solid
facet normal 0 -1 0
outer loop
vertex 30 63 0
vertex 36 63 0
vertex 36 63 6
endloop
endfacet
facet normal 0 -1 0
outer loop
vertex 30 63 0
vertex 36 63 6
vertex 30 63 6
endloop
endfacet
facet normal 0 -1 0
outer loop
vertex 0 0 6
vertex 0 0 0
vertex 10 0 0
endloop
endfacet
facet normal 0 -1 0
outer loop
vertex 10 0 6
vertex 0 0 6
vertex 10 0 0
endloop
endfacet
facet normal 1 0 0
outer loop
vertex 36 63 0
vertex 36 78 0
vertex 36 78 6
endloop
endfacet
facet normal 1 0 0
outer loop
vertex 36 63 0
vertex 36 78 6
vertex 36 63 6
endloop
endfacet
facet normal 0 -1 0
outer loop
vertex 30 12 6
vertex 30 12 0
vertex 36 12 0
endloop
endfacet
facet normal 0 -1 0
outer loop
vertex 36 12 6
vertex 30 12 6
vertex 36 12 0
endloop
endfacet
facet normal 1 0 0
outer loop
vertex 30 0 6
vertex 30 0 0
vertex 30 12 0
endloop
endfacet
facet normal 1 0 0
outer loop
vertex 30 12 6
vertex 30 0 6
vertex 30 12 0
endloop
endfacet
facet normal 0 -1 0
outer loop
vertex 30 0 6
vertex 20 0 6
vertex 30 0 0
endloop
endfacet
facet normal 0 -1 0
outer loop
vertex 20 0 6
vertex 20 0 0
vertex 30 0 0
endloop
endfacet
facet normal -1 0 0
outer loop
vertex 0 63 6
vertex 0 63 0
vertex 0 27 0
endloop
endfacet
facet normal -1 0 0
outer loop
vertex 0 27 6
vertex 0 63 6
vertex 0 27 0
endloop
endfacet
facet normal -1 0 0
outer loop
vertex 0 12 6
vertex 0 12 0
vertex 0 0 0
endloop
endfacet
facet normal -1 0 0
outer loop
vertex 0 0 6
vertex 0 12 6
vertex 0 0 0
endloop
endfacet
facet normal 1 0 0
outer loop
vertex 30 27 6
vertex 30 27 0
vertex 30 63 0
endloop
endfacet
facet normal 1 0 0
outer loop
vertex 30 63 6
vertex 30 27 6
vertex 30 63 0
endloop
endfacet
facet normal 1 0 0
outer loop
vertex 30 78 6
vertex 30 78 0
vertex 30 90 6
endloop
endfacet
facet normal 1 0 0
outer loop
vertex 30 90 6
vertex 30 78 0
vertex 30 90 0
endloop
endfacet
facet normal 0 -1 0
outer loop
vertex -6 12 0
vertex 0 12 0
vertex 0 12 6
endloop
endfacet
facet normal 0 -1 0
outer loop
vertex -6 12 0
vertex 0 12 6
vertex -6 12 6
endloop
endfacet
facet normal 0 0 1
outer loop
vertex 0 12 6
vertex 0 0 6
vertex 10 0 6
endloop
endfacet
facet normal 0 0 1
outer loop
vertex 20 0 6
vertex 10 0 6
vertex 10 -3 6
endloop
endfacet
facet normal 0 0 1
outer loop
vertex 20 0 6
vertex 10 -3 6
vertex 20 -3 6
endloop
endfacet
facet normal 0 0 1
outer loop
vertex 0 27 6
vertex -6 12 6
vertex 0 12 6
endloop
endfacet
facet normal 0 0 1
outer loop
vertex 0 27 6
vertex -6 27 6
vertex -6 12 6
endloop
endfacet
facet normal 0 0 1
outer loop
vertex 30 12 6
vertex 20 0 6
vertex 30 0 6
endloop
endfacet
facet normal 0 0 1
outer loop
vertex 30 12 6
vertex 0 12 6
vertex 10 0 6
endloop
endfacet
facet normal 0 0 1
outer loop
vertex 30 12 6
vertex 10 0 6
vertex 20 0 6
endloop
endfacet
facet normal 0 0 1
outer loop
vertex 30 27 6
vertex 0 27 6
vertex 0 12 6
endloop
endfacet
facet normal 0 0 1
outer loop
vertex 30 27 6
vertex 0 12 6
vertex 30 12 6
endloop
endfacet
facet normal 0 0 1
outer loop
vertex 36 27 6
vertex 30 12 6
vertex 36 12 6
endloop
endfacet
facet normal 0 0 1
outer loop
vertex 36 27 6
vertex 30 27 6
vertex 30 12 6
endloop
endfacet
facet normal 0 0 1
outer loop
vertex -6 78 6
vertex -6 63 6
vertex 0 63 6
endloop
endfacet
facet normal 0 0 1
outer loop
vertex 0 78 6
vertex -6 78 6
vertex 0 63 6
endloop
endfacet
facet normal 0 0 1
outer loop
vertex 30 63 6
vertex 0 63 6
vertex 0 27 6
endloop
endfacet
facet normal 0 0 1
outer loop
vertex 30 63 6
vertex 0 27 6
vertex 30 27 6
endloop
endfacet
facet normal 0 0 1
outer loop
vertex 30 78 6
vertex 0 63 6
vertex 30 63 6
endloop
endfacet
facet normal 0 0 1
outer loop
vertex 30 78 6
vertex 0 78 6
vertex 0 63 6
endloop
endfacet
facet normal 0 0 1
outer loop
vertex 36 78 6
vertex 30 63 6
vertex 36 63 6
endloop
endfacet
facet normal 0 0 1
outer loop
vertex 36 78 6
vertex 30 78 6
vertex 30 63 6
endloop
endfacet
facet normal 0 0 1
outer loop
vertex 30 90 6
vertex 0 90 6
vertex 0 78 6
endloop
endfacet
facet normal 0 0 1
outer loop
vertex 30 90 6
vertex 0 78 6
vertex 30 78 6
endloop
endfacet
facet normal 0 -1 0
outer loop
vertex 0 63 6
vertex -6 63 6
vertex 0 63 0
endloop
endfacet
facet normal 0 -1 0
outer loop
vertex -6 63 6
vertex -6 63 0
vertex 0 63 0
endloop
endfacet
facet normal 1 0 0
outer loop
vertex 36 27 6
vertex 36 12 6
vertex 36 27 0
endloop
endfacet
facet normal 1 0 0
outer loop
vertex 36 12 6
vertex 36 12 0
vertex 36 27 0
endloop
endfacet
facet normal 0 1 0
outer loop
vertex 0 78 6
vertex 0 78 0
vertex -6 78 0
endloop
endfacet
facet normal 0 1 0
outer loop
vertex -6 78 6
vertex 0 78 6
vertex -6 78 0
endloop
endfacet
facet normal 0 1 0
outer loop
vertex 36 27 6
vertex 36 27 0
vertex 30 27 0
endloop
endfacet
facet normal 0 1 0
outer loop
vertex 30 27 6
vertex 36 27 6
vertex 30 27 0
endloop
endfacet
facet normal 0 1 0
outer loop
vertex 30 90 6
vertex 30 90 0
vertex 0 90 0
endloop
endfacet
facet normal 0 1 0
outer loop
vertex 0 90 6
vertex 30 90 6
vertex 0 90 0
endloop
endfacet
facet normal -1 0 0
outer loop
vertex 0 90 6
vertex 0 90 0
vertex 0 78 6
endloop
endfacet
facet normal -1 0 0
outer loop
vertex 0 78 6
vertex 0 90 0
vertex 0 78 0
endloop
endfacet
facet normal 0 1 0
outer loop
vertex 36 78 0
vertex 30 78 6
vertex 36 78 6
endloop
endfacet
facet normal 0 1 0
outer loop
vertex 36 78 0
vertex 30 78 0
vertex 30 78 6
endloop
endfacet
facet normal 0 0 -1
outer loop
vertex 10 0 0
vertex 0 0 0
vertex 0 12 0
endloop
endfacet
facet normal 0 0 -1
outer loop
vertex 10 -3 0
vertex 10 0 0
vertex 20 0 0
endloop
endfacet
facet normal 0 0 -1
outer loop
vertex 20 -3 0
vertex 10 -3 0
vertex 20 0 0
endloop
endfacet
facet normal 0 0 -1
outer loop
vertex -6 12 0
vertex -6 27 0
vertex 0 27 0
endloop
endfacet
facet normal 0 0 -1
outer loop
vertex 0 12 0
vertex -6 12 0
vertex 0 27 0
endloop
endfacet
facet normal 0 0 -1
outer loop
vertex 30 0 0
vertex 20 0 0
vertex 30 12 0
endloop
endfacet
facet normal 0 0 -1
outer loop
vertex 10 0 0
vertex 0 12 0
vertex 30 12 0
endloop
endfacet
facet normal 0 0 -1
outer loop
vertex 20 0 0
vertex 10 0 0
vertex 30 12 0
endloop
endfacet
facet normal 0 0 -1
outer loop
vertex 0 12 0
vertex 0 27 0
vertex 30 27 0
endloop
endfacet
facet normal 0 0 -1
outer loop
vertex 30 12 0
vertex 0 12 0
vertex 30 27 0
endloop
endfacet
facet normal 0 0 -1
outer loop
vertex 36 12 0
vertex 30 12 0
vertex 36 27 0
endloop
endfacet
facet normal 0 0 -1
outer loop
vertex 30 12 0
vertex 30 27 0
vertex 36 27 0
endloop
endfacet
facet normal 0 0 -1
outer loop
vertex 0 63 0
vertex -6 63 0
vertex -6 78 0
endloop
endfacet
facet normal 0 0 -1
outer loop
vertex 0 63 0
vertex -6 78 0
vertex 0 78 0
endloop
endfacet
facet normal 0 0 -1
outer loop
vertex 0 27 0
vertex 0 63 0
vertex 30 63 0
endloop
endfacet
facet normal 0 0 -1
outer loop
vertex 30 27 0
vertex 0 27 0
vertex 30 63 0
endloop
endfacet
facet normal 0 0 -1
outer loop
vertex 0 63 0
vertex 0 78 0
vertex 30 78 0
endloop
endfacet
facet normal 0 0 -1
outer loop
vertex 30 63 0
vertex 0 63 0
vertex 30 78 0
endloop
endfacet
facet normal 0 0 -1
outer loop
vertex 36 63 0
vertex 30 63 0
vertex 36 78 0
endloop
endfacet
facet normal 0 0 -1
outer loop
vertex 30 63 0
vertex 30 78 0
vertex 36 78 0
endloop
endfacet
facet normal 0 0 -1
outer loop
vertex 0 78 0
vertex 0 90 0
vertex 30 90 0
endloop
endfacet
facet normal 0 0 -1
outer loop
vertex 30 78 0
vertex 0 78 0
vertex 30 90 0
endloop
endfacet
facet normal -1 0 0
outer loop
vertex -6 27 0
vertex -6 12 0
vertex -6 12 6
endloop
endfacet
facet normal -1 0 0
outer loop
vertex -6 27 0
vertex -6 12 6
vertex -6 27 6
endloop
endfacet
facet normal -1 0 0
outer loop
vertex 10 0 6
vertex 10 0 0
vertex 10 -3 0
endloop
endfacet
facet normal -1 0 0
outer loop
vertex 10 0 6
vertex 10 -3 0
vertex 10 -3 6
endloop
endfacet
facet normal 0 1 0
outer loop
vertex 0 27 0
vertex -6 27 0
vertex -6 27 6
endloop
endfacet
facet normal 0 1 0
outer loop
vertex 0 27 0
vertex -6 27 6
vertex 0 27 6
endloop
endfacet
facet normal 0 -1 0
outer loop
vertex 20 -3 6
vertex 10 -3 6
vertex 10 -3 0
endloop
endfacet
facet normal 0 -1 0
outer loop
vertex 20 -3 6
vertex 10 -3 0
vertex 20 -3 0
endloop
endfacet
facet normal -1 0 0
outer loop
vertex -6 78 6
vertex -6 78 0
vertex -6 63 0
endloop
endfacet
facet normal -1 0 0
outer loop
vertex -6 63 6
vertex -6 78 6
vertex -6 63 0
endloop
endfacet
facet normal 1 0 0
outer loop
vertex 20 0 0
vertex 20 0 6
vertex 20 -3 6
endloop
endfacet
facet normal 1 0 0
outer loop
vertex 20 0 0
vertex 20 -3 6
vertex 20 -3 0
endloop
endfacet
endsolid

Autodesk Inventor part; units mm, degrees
ref_plane "YZ Plane" through (0, 0, 0) normal (1, 0, 0) x (0, 1, 0)
ref_plane "XZ Plane" through (0, 0, 0) normal (0, 1, 0) x (-1, 0, 0)
ref_plane "XY Plane" through (0, 0, 0) normal (0, 0, 1) x (1, 0, 0)
sketch "Boceto1" plane through (0, 0, 0) normal (0, 0, 1) x (1, 0, 0)
  line L0 (0, 0) -> (30, 0)
  line L1 (30, 0) -> (30, 90)
  line L2 (30, 90) -> (0, 90)
  line L3 (0, 90) -> (0, 0)
  line L4 (30, 78) -> (36, 78)
  line L5 (36, 78) -> (36, 63)
  line L6 (36, 63) -> (30, 63)
  line L7 (30, 63) -> (30, 78)
  line L8 (30, 45) -> (0, 45) construction
  line L9 (30, 12) -> (36, 12)
  line L10 (36, 12) -> (36, 27)
  line L11 (36, 27) -> (30, 27)
  line L12 (30, 27) -> (30, 12)
  line L13 (15, 90) -> (15, 45) construction
  line L14 (0, 78) -> (-6, 78)
  line L15 (-6, 78) -> (-6, 63)
  line L16 (-6, 63) -> (0, 63)
  line L17 (0, 63) -> (0, 78)
  line L18 (0, 12) -> (-6, 12)
  line L19 (-6, 12) -> (-6, 27)
  line L20 (-6, 27) -> (0, 27)
  line L21 (0, 27) -> (0, 12)
  point P0 (30, 12)
  point P1 (30, 27)
  point P2 (30, 63)
  dimension "d0" = 30
  dimension "d1" = 90
  dimension "d2" = 6
  dimension "d3" = 15
  dimension "d4" = 12
extrude "Extrusión1" add sketch "Boceto1" along normal blind 6
sketch "Boceto3" plane through (0, 0, 0) normal (0, -1, 0) x (1, 0, 0)
  line L0 (30, 6) -> (0, 6) projected
  line L1 (30, 0) -> (0, 0) projected
  line L2 (10, 6) -> (20, 6)
  line L3 (20, 6) -> (20, 0)
  line L4 (20, 0) -> (10, 0)
  line L5 (10, 0) -> (10, 6)
  point P0 (15, 6)
  point P1 (15, 6)
  dimension "d11" = 10
extrude "Extrusión3" add sketch "Boceto3" along normal blind 3
properties part number "Caja_CaraFrontal"
